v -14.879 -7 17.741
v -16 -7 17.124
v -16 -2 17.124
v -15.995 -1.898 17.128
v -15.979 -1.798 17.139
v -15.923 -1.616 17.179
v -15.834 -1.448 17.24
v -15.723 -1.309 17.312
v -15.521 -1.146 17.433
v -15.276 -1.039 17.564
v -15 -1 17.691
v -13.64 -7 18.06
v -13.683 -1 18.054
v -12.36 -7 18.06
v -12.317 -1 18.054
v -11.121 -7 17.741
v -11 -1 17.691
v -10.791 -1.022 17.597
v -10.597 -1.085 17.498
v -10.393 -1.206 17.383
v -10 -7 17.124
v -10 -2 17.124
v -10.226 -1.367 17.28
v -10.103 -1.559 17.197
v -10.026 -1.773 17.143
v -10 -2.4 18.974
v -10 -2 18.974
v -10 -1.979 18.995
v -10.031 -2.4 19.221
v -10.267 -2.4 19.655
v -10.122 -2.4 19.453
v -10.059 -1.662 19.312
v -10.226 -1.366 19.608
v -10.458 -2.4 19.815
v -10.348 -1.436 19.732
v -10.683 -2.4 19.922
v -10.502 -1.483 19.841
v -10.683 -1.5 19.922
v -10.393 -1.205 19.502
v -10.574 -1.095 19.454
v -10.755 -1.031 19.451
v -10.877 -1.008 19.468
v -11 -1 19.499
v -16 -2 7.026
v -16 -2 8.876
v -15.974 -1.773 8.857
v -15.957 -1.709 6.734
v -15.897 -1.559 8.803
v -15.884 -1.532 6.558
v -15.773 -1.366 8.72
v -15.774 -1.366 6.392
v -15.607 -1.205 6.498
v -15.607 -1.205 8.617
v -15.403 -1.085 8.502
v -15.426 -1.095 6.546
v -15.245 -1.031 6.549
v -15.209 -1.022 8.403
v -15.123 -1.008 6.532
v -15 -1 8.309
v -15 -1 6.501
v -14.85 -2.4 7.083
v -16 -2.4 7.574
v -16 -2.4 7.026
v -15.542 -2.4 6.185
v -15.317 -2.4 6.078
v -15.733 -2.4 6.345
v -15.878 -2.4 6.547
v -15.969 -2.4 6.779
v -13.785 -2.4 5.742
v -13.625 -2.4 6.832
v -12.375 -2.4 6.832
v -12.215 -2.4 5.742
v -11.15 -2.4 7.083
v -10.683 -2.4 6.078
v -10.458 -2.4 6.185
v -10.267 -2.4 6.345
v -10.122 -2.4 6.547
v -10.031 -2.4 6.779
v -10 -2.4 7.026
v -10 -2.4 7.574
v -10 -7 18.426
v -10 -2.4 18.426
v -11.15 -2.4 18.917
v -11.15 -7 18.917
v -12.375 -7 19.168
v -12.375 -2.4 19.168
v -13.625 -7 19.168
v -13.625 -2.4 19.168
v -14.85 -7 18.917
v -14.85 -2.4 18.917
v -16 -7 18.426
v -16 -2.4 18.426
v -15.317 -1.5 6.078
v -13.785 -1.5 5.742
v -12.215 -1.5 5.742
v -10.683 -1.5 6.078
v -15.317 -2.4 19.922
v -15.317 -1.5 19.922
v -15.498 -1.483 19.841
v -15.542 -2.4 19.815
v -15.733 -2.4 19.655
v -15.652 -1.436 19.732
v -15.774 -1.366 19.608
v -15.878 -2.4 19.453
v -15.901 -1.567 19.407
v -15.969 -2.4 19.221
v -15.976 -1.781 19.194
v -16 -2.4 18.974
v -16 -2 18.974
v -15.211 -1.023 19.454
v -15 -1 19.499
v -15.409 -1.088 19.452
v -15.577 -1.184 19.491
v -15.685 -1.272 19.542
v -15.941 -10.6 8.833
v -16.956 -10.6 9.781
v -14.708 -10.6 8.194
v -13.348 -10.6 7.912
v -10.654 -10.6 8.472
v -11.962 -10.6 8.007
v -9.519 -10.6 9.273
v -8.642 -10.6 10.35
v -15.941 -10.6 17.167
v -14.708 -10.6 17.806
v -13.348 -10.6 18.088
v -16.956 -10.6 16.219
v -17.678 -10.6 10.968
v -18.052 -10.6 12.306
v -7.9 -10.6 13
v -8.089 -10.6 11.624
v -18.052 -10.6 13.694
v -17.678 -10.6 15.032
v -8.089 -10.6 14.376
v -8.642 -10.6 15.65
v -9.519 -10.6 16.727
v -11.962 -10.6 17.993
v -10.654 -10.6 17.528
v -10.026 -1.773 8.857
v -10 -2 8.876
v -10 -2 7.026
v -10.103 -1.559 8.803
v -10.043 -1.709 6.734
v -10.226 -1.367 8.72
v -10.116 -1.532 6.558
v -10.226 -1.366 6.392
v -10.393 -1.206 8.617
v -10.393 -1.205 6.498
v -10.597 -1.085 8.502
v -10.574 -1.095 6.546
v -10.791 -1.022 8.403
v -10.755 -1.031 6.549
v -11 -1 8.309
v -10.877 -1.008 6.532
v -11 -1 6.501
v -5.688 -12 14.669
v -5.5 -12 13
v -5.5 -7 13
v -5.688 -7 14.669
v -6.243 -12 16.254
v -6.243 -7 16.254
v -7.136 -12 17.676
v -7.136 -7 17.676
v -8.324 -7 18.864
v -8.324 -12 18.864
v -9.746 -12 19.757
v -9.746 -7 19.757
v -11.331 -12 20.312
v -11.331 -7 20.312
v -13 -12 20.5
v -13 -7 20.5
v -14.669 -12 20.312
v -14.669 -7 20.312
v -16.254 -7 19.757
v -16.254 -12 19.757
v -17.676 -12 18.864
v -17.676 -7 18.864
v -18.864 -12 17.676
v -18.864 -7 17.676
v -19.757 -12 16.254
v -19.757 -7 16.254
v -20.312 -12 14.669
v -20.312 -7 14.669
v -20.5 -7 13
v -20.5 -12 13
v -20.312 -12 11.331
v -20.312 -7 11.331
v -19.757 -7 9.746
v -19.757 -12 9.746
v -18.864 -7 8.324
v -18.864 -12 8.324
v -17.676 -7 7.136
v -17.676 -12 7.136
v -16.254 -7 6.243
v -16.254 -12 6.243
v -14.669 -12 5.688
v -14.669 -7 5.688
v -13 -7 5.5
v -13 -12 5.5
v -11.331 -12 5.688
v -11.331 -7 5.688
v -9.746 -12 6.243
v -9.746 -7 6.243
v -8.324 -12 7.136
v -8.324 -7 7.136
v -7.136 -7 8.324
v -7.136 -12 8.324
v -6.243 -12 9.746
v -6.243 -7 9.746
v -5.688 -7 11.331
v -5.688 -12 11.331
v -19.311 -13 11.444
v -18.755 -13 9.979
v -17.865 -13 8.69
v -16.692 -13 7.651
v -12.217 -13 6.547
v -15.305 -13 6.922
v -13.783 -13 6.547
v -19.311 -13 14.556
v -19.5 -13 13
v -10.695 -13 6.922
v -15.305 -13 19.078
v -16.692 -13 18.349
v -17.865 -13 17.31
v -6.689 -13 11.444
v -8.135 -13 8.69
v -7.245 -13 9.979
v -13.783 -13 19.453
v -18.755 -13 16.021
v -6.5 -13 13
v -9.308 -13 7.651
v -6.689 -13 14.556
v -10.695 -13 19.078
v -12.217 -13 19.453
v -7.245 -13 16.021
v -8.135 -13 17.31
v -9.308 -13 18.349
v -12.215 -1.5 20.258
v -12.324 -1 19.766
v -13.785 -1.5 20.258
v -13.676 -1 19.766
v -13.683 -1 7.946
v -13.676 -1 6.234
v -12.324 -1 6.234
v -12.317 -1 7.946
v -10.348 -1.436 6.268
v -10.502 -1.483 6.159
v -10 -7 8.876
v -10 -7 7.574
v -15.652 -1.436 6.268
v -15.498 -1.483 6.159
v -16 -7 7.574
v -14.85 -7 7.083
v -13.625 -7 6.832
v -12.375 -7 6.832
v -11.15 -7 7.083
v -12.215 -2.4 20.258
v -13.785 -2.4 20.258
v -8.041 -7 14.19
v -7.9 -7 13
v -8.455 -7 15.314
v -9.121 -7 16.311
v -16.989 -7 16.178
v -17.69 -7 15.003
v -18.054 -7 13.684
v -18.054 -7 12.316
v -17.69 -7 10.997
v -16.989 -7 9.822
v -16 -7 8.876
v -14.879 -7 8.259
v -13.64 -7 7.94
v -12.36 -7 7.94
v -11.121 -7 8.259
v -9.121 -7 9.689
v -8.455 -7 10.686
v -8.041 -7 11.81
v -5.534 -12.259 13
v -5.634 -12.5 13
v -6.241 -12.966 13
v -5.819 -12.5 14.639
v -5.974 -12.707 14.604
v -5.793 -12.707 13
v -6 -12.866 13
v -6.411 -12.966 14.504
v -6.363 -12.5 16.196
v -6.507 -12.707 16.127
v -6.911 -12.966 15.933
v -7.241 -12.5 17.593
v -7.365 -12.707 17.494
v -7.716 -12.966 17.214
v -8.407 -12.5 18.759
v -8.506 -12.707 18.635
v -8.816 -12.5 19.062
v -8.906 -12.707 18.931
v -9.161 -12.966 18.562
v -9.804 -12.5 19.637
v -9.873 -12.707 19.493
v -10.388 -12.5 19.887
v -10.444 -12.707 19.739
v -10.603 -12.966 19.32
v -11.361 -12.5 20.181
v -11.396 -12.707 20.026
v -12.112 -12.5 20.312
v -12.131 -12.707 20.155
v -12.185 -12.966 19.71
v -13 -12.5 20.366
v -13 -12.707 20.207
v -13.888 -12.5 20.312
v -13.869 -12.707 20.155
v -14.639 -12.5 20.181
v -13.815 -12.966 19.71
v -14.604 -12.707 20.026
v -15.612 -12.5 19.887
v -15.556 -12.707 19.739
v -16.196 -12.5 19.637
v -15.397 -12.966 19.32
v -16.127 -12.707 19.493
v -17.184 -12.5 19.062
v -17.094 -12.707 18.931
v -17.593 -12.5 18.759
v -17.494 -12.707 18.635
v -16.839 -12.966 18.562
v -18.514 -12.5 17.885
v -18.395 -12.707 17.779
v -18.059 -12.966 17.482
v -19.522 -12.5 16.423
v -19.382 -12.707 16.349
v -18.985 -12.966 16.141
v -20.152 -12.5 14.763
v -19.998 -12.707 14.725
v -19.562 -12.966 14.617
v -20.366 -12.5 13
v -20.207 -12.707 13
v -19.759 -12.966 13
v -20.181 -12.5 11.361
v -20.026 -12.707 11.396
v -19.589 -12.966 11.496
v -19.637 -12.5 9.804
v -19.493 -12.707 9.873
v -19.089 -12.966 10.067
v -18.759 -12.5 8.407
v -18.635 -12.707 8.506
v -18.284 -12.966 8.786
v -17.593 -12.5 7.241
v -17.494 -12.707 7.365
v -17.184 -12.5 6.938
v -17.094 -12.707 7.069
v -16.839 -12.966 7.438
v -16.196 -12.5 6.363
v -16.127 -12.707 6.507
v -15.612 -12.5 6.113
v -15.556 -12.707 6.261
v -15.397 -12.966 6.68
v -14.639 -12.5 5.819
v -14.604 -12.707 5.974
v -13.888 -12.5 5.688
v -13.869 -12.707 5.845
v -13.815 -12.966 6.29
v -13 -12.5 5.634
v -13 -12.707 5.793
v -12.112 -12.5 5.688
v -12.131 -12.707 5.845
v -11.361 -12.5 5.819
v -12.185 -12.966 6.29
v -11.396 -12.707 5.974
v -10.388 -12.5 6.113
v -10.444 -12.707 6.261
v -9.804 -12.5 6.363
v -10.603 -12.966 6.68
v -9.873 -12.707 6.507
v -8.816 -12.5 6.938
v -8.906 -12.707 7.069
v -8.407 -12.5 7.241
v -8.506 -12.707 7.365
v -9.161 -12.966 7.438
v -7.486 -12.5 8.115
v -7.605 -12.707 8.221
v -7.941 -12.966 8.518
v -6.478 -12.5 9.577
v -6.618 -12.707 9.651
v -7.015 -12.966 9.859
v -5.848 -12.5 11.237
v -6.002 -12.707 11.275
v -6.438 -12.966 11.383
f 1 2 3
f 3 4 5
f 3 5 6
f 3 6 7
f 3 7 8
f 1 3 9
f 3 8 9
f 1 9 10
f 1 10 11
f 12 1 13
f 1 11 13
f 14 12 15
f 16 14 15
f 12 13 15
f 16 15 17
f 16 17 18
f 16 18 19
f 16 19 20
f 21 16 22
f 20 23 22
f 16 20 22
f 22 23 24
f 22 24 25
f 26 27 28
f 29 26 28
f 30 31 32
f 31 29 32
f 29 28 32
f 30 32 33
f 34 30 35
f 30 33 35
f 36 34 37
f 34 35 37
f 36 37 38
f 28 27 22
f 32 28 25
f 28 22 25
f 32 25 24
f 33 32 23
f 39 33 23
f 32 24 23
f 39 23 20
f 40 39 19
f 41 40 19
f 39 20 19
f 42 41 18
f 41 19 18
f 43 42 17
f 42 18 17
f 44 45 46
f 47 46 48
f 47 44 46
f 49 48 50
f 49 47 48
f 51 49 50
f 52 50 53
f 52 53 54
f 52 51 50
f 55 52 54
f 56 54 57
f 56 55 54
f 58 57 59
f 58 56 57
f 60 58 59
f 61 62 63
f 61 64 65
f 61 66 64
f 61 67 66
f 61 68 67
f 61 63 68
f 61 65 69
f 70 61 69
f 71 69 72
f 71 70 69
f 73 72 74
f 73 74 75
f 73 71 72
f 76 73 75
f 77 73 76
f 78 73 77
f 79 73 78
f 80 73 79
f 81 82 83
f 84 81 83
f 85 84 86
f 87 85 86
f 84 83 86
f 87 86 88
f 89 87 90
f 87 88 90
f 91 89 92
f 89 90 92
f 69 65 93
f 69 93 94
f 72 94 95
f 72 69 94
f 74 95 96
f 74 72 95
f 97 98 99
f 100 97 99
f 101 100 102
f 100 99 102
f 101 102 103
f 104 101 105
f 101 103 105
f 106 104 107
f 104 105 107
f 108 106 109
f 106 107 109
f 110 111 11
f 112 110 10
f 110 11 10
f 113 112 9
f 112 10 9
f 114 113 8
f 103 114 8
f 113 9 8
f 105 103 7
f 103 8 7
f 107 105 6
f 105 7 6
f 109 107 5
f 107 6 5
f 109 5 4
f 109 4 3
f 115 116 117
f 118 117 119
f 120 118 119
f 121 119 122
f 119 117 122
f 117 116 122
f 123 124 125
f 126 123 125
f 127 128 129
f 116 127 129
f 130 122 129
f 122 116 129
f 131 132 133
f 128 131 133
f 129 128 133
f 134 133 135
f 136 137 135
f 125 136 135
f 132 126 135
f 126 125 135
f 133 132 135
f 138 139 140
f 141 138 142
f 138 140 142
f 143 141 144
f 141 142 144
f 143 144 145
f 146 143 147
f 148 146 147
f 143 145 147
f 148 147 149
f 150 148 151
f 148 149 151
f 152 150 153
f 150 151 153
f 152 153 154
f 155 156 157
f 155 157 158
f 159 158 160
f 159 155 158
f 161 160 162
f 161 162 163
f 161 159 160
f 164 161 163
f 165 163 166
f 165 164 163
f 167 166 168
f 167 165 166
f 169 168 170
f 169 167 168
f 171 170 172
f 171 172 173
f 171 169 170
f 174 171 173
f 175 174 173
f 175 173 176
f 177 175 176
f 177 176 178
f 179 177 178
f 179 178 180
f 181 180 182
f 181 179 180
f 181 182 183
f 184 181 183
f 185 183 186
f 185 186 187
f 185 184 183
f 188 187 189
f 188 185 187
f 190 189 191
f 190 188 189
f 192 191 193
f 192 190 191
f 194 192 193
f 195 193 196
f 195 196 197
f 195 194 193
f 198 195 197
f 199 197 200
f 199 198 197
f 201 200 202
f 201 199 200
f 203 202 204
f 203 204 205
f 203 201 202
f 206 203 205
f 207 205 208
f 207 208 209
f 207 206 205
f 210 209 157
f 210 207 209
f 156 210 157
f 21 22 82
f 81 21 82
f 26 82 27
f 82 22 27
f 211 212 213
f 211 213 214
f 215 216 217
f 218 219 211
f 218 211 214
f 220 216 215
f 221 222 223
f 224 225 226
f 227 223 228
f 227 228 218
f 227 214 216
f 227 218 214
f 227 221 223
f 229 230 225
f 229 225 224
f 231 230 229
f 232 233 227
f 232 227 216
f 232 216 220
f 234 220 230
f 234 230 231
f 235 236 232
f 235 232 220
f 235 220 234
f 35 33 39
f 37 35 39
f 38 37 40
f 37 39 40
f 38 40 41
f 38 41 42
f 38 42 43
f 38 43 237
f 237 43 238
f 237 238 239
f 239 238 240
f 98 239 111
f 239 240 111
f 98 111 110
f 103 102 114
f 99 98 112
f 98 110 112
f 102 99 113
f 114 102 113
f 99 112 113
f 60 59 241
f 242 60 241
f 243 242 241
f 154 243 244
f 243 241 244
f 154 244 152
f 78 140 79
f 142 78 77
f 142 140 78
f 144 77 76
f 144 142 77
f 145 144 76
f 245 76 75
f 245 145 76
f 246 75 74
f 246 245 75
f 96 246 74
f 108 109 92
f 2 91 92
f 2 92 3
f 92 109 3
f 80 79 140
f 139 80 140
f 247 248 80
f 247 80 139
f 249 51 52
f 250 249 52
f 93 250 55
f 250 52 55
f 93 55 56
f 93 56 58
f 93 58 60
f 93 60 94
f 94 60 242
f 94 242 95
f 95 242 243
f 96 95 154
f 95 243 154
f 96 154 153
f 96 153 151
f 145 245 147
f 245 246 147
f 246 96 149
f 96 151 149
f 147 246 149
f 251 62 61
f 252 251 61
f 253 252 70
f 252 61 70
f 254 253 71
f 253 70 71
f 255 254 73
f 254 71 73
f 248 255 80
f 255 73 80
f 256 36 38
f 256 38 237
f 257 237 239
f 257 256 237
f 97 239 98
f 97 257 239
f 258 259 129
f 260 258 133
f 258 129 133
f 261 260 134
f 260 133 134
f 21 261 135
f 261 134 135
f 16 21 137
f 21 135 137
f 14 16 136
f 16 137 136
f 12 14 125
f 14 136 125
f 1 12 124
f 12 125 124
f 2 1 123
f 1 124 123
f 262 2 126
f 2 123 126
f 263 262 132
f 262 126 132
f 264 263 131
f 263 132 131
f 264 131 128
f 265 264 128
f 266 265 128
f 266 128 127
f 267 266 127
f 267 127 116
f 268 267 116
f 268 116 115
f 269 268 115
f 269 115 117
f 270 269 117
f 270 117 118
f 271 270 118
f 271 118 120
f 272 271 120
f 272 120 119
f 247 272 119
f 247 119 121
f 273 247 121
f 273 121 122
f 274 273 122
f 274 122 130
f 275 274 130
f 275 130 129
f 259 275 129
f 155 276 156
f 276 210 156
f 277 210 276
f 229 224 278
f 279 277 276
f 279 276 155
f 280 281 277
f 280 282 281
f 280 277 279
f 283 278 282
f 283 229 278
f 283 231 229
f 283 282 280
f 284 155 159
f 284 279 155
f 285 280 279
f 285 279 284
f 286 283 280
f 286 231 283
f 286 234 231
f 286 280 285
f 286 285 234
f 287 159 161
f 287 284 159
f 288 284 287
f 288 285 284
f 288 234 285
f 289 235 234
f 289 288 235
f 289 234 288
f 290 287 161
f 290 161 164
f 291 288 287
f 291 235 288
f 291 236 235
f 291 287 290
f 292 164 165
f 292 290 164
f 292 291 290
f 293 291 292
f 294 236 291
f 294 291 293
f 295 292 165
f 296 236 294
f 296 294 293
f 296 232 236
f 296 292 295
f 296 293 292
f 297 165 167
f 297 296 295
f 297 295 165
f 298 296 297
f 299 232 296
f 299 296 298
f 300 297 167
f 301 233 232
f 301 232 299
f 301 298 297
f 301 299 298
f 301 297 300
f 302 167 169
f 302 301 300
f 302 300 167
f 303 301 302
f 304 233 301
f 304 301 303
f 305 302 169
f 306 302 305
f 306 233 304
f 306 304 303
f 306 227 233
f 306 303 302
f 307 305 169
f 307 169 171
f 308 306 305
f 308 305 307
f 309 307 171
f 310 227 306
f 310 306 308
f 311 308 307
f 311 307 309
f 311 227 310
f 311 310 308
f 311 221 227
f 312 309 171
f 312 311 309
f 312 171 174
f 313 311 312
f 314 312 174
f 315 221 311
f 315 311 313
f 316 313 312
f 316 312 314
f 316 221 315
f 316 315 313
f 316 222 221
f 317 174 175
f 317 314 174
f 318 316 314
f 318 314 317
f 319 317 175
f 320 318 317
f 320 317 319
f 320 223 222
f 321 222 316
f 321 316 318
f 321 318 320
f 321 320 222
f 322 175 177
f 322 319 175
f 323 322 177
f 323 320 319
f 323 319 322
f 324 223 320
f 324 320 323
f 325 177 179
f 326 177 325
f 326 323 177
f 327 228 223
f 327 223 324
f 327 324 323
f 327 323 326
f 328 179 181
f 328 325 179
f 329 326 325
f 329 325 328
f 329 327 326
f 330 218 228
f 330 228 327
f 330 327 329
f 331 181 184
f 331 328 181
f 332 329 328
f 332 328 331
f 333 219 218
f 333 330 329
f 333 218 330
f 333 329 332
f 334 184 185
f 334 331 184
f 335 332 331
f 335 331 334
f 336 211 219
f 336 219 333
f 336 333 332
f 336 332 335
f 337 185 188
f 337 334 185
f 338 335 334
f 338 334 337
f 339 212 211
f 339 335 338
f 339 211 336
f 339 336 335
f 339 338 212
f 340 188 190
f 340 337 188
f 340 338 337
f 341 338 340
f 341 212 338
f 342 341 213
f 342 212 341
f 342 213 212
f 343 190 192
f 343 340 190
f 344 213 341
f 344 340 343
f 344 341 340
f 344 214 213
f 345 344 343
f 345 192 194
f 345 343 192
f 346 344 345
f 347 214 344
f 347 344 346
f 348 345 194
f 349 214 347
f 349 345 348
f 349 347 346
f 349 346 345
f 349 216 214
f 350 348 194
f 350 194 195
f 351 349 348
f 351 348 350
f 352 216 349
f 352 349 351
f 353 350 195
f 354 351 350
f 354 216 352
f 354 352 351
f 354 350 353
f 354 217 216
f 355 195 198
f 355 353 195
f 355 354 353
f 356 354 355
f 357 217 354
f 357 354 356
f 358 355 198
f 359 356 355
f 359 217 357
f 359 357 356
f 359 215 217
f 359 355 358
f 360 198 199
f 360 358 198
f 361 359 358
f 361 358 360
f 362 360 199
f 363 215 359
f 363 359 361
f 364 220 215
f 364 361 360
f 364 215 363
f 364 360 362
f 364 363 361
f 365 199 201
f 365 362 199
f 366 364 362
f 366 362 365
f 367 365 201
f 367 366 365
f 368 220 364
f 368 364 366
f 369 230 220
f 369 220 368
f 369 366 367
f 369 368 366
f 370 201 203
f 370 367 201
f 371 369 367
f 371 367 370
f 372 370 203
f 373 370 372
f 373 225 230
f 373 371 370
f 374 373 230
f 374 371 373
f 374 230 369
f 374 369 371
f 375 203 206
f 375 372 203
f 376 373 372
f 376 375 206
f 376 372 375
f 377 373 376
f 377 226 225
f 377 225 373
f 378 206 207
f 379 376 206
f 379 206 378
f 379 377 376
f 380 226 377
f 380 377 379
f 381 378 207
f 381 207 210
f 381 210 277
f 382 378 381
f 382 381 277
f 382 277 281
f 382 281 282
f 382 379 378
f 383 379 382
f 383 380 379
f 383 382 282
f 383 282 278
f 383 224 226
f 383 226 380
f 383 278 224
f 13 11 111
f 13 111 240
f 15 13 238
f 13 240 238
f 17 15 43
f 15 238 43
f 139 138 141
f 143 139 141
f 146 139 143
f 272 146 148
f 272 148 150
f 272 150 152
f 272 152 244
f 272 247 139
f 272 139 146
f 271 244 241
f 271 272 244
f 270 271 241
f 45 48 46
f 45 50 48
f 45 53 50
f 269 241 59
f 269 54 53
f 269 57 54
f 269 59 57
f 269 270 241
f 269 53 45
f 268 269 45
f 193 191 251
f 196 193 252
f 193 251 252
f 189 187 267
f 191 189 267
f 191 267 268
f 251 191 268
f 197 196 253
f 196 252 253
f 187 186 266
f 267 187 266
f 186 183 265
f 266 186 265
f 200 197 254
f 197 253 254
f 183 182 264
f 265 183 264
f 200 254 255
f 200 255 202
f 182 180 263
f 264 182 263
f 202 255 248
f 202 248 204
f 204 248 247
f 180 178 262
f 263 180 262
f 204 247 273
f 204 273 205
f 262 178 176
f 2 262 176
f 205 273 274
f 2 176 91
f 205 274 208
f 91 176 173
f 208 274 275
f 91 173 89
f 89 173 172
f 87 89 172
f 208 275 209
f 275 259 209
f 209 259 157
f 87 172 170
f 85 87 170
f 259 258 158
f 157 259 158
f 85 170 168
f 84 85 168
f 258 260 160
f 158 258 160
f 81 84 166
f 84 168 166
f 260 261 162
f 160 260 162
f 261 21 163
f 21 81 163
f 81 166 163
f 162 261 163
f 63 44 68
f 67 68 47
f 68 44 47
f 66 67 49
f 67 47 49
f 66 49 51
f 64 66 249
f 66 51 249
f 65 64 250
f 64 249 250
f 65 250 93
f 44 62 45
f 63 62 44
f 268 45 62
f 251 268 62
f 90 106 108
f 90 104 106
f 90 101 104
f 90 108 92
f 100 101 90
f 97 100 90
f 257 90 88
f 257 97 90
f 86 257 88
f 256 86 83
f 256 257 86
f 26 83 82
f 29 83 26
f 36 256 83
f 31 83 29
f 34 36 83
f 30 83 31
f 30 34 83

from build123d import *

# Parameters (mm, degrees)
F1_R         = 7.5
F2_DEPTH     = 6
F3_R         = 1
F4_T         = -2.4
F7_DEPTH     = 4.6
F9_DEPTH     = 1.4
F10_SIZE     = 0.5
F11_T1_DEPTH = 4.5650872514
F11_T3_DEPTH = 6.9781403955
F11_T5_DEPTH = 6.9781403955


# Not quite as in the source:
# - a fillet or chamfer that OpenCascade refuses, or shapes differently, is made with other operations: its cross-section is extruded or revolved along the edge and cut away or added


with BuildPart() as f2:
    # F1 (on offset) → F2 (new body)
    with BuildSketch(Plane.XZ.offset(13)):
        with Locations((-13, 13)):
            Circle(F1_R)
    extrude(amount=-F2_DEPTH)

    # F3
    f3_edges = [f2.edges().sort_by_distance(p)[0] for p in [
        (-20.5, -13, 13),
    ]]
    fillet(f3_edges, radius=F3_R)

    # F4
    f4_openings = [f2.faces().sort_by_distance(p)[0] for p in [
        (-13, -7, 13),
    ]]
    offset(amount=F4_T, openings=f4_openings)

    # F6 (on offset) → F7 (join, through all)
    with BuildSketch(Plane.XZ.offset(2.4)):
        with BuildLine():
            Line((-10, 17.1243181255), (-10, 18.4258639865))
            ThreePointArc((-10, 18.4258639865), (-13, 19.2), (-16, 18.4258639865))
            Line((-16, 18.4258639865), (-16, 17.1243181255))
            ThreePointArc((-16, 17.1243181255), (-13, 18.1), (-10, 17.1243181255))
        make_face()
        with BuildLine():
            ThreePointArc((-10, 8.8756818745), (-13, 7.9), (-16, 8.8756818745))
            Line((-16, 8.8756818745), (-16, 7.5741360135))
            ThreePointArc((-16, 7.5741360135), (-13, 6.8), (-10, 7.5741360135))
            Line((-10, 7.5741360135), (-10, 8.8756818745))
        make_face()
    extrude(amount=F7_DEPTH)

    # F8 (on offset) → F9 (join)
    with BuildSketch(Plane.XZ.offset(2.4)):
        with BuildLine():
            Line((-16, 8.8756818745), (-16, 6.3449267472))
            ThreePointArc((-16, 6.3449267472), (-13, 5.7), (-10, 6.3449267472))
            Line((-10, 6.3449267472), (-10, 8.8756818745))
            ThreePointArc((-10, 8.8756818745), (-13, 7.9), (-16, 8.8756818745))
        make_face()
        with BuildLine():
            Line((-10, 17.1243181255), (-10, 19.6550732528))
            ThreePointArc((-10, 19.6550732528), (-13, 20.3), (-16, 19.6550732528))
            Line((-16, 19.6550732528), (-16, 17.1243181255))
            ThreePointArc((-16, 17.1243181255), (-13, 18.1), (-10, 17.1243181255))
        make_face()
    extrude(amount=-F9_DEPTH)

    # F10
    f10_edges = [f2.edges().sort_by_distance(p)[0] for p in [
        (-13, -1, 5.7),
        (-13, -1, 20.3),
    ]]
    chamfer(f10_edges, length=F10_SIZE)

    # F11: fillet of radius 1 on 8 edges, made by hand

    # F11_s2 → F11_t1 (cut)
    with BuildSketch(Plane.XZ.offset(-0.3325436257)):
        with BuildLine():
            ThreePointArc((-10, 18.9741108125), (-10.1883780691, 19.5582938671), (-10.6825396825, 19.92238237))
            ThreePointArc((-10.6825396825, 19.92238237), (-10.3379125488, 19.7973002289), (-10, 19.6550732528))
            Line((-10, 19.6550732528), (-10, 18.9741108125))
        make_face()
        with BuildLine():
            ThreePointArc((-15.3174603175, 19.92238237), (-15.8116219309, 19.5582938671), (-16, 18.9741108125))
            Line((-16, 18.9741108125), (-16, 19.6550732528))
            ThreePointArc((-16, 19.6550732528), (-15.6620874512, 19.7973002289), (-15.3174603175, 19.92238237))
        make_face()
        with BuildLine():
            ThreePointArc((-10, 7.0258891875), (-10.1883780691, 6.4417061329), (-10.6825396825, 6.07761763))
            ThreePointArc((-10.6825396825, 6.07761763), (-10.3379125488, 6.2026997711), (-10, 6.3449267472))
            Line((-10, 6.3449267472), (-10, 7.0258891875))
        make_face()
        with BuildLine():
            ThreePointArc((-16, 7.0258891875), (-15.8116219309, 6.4417061329), (-15.3174603175, 6.07761763))
            ThreePointArc((-15.3174603175, 6.07761763), (-15.6620874512, 6.2026997711), (-16, 6.3449267472))
            Line((-16, 6.3449267472), (-16, 7.0258891875))
        make_face()
    extrude(amount=F11_T1_DEPTH, mode=Mode.SUBTRACT)

    # F11_s4 → F11_t3 (cut)
    with BuildSketch(Plane.XY.offset(14.6243181255)):
        with BuildLine():
            ThreePointArc((-10, -2), (-10.2928932188, -1.2928932188), (-11, -1))
            Line((-11, -1), (-10, -1))
            Line((-10, -1), (-10, -2))
        make_face()
        with BuildLine():
            ThreePointArc((-15, -1), (-15.7071067812, -1.2928932188), (-16, -2))
            Line((-16, -2), (-16, -1))
            Line((-16, -1), (-15, -1))
        make_face()
    extrude(amount=F11_T3_DEPTH, mode=Mode.SUBTRACT)

    # F11_s6 → F11_t5 (cut)
    with BuildSketch(Plane.XY.offset(4.397541479)):
        with BuildLine():
            ThreePointArc((-16, -2), (-15.7071067812, -1.2928932188), (-15, -1))
            Line((-15, -1), (-16, -1))
            Line((-16, -1), (-16, -2))
        make_face()
        with BuildLine():
            ThreePointArc((-10, -2), (-10.2928932188, -1.2928932188), (-11, -1))
            Line((-11, -1), (-10, -1))
            Line((-10, -1), (-10, -2))
        make_face()
    extrude(amount=F11_T5_DEPTH, mode=Mode.SUBTRACT)


solid = f2.part
